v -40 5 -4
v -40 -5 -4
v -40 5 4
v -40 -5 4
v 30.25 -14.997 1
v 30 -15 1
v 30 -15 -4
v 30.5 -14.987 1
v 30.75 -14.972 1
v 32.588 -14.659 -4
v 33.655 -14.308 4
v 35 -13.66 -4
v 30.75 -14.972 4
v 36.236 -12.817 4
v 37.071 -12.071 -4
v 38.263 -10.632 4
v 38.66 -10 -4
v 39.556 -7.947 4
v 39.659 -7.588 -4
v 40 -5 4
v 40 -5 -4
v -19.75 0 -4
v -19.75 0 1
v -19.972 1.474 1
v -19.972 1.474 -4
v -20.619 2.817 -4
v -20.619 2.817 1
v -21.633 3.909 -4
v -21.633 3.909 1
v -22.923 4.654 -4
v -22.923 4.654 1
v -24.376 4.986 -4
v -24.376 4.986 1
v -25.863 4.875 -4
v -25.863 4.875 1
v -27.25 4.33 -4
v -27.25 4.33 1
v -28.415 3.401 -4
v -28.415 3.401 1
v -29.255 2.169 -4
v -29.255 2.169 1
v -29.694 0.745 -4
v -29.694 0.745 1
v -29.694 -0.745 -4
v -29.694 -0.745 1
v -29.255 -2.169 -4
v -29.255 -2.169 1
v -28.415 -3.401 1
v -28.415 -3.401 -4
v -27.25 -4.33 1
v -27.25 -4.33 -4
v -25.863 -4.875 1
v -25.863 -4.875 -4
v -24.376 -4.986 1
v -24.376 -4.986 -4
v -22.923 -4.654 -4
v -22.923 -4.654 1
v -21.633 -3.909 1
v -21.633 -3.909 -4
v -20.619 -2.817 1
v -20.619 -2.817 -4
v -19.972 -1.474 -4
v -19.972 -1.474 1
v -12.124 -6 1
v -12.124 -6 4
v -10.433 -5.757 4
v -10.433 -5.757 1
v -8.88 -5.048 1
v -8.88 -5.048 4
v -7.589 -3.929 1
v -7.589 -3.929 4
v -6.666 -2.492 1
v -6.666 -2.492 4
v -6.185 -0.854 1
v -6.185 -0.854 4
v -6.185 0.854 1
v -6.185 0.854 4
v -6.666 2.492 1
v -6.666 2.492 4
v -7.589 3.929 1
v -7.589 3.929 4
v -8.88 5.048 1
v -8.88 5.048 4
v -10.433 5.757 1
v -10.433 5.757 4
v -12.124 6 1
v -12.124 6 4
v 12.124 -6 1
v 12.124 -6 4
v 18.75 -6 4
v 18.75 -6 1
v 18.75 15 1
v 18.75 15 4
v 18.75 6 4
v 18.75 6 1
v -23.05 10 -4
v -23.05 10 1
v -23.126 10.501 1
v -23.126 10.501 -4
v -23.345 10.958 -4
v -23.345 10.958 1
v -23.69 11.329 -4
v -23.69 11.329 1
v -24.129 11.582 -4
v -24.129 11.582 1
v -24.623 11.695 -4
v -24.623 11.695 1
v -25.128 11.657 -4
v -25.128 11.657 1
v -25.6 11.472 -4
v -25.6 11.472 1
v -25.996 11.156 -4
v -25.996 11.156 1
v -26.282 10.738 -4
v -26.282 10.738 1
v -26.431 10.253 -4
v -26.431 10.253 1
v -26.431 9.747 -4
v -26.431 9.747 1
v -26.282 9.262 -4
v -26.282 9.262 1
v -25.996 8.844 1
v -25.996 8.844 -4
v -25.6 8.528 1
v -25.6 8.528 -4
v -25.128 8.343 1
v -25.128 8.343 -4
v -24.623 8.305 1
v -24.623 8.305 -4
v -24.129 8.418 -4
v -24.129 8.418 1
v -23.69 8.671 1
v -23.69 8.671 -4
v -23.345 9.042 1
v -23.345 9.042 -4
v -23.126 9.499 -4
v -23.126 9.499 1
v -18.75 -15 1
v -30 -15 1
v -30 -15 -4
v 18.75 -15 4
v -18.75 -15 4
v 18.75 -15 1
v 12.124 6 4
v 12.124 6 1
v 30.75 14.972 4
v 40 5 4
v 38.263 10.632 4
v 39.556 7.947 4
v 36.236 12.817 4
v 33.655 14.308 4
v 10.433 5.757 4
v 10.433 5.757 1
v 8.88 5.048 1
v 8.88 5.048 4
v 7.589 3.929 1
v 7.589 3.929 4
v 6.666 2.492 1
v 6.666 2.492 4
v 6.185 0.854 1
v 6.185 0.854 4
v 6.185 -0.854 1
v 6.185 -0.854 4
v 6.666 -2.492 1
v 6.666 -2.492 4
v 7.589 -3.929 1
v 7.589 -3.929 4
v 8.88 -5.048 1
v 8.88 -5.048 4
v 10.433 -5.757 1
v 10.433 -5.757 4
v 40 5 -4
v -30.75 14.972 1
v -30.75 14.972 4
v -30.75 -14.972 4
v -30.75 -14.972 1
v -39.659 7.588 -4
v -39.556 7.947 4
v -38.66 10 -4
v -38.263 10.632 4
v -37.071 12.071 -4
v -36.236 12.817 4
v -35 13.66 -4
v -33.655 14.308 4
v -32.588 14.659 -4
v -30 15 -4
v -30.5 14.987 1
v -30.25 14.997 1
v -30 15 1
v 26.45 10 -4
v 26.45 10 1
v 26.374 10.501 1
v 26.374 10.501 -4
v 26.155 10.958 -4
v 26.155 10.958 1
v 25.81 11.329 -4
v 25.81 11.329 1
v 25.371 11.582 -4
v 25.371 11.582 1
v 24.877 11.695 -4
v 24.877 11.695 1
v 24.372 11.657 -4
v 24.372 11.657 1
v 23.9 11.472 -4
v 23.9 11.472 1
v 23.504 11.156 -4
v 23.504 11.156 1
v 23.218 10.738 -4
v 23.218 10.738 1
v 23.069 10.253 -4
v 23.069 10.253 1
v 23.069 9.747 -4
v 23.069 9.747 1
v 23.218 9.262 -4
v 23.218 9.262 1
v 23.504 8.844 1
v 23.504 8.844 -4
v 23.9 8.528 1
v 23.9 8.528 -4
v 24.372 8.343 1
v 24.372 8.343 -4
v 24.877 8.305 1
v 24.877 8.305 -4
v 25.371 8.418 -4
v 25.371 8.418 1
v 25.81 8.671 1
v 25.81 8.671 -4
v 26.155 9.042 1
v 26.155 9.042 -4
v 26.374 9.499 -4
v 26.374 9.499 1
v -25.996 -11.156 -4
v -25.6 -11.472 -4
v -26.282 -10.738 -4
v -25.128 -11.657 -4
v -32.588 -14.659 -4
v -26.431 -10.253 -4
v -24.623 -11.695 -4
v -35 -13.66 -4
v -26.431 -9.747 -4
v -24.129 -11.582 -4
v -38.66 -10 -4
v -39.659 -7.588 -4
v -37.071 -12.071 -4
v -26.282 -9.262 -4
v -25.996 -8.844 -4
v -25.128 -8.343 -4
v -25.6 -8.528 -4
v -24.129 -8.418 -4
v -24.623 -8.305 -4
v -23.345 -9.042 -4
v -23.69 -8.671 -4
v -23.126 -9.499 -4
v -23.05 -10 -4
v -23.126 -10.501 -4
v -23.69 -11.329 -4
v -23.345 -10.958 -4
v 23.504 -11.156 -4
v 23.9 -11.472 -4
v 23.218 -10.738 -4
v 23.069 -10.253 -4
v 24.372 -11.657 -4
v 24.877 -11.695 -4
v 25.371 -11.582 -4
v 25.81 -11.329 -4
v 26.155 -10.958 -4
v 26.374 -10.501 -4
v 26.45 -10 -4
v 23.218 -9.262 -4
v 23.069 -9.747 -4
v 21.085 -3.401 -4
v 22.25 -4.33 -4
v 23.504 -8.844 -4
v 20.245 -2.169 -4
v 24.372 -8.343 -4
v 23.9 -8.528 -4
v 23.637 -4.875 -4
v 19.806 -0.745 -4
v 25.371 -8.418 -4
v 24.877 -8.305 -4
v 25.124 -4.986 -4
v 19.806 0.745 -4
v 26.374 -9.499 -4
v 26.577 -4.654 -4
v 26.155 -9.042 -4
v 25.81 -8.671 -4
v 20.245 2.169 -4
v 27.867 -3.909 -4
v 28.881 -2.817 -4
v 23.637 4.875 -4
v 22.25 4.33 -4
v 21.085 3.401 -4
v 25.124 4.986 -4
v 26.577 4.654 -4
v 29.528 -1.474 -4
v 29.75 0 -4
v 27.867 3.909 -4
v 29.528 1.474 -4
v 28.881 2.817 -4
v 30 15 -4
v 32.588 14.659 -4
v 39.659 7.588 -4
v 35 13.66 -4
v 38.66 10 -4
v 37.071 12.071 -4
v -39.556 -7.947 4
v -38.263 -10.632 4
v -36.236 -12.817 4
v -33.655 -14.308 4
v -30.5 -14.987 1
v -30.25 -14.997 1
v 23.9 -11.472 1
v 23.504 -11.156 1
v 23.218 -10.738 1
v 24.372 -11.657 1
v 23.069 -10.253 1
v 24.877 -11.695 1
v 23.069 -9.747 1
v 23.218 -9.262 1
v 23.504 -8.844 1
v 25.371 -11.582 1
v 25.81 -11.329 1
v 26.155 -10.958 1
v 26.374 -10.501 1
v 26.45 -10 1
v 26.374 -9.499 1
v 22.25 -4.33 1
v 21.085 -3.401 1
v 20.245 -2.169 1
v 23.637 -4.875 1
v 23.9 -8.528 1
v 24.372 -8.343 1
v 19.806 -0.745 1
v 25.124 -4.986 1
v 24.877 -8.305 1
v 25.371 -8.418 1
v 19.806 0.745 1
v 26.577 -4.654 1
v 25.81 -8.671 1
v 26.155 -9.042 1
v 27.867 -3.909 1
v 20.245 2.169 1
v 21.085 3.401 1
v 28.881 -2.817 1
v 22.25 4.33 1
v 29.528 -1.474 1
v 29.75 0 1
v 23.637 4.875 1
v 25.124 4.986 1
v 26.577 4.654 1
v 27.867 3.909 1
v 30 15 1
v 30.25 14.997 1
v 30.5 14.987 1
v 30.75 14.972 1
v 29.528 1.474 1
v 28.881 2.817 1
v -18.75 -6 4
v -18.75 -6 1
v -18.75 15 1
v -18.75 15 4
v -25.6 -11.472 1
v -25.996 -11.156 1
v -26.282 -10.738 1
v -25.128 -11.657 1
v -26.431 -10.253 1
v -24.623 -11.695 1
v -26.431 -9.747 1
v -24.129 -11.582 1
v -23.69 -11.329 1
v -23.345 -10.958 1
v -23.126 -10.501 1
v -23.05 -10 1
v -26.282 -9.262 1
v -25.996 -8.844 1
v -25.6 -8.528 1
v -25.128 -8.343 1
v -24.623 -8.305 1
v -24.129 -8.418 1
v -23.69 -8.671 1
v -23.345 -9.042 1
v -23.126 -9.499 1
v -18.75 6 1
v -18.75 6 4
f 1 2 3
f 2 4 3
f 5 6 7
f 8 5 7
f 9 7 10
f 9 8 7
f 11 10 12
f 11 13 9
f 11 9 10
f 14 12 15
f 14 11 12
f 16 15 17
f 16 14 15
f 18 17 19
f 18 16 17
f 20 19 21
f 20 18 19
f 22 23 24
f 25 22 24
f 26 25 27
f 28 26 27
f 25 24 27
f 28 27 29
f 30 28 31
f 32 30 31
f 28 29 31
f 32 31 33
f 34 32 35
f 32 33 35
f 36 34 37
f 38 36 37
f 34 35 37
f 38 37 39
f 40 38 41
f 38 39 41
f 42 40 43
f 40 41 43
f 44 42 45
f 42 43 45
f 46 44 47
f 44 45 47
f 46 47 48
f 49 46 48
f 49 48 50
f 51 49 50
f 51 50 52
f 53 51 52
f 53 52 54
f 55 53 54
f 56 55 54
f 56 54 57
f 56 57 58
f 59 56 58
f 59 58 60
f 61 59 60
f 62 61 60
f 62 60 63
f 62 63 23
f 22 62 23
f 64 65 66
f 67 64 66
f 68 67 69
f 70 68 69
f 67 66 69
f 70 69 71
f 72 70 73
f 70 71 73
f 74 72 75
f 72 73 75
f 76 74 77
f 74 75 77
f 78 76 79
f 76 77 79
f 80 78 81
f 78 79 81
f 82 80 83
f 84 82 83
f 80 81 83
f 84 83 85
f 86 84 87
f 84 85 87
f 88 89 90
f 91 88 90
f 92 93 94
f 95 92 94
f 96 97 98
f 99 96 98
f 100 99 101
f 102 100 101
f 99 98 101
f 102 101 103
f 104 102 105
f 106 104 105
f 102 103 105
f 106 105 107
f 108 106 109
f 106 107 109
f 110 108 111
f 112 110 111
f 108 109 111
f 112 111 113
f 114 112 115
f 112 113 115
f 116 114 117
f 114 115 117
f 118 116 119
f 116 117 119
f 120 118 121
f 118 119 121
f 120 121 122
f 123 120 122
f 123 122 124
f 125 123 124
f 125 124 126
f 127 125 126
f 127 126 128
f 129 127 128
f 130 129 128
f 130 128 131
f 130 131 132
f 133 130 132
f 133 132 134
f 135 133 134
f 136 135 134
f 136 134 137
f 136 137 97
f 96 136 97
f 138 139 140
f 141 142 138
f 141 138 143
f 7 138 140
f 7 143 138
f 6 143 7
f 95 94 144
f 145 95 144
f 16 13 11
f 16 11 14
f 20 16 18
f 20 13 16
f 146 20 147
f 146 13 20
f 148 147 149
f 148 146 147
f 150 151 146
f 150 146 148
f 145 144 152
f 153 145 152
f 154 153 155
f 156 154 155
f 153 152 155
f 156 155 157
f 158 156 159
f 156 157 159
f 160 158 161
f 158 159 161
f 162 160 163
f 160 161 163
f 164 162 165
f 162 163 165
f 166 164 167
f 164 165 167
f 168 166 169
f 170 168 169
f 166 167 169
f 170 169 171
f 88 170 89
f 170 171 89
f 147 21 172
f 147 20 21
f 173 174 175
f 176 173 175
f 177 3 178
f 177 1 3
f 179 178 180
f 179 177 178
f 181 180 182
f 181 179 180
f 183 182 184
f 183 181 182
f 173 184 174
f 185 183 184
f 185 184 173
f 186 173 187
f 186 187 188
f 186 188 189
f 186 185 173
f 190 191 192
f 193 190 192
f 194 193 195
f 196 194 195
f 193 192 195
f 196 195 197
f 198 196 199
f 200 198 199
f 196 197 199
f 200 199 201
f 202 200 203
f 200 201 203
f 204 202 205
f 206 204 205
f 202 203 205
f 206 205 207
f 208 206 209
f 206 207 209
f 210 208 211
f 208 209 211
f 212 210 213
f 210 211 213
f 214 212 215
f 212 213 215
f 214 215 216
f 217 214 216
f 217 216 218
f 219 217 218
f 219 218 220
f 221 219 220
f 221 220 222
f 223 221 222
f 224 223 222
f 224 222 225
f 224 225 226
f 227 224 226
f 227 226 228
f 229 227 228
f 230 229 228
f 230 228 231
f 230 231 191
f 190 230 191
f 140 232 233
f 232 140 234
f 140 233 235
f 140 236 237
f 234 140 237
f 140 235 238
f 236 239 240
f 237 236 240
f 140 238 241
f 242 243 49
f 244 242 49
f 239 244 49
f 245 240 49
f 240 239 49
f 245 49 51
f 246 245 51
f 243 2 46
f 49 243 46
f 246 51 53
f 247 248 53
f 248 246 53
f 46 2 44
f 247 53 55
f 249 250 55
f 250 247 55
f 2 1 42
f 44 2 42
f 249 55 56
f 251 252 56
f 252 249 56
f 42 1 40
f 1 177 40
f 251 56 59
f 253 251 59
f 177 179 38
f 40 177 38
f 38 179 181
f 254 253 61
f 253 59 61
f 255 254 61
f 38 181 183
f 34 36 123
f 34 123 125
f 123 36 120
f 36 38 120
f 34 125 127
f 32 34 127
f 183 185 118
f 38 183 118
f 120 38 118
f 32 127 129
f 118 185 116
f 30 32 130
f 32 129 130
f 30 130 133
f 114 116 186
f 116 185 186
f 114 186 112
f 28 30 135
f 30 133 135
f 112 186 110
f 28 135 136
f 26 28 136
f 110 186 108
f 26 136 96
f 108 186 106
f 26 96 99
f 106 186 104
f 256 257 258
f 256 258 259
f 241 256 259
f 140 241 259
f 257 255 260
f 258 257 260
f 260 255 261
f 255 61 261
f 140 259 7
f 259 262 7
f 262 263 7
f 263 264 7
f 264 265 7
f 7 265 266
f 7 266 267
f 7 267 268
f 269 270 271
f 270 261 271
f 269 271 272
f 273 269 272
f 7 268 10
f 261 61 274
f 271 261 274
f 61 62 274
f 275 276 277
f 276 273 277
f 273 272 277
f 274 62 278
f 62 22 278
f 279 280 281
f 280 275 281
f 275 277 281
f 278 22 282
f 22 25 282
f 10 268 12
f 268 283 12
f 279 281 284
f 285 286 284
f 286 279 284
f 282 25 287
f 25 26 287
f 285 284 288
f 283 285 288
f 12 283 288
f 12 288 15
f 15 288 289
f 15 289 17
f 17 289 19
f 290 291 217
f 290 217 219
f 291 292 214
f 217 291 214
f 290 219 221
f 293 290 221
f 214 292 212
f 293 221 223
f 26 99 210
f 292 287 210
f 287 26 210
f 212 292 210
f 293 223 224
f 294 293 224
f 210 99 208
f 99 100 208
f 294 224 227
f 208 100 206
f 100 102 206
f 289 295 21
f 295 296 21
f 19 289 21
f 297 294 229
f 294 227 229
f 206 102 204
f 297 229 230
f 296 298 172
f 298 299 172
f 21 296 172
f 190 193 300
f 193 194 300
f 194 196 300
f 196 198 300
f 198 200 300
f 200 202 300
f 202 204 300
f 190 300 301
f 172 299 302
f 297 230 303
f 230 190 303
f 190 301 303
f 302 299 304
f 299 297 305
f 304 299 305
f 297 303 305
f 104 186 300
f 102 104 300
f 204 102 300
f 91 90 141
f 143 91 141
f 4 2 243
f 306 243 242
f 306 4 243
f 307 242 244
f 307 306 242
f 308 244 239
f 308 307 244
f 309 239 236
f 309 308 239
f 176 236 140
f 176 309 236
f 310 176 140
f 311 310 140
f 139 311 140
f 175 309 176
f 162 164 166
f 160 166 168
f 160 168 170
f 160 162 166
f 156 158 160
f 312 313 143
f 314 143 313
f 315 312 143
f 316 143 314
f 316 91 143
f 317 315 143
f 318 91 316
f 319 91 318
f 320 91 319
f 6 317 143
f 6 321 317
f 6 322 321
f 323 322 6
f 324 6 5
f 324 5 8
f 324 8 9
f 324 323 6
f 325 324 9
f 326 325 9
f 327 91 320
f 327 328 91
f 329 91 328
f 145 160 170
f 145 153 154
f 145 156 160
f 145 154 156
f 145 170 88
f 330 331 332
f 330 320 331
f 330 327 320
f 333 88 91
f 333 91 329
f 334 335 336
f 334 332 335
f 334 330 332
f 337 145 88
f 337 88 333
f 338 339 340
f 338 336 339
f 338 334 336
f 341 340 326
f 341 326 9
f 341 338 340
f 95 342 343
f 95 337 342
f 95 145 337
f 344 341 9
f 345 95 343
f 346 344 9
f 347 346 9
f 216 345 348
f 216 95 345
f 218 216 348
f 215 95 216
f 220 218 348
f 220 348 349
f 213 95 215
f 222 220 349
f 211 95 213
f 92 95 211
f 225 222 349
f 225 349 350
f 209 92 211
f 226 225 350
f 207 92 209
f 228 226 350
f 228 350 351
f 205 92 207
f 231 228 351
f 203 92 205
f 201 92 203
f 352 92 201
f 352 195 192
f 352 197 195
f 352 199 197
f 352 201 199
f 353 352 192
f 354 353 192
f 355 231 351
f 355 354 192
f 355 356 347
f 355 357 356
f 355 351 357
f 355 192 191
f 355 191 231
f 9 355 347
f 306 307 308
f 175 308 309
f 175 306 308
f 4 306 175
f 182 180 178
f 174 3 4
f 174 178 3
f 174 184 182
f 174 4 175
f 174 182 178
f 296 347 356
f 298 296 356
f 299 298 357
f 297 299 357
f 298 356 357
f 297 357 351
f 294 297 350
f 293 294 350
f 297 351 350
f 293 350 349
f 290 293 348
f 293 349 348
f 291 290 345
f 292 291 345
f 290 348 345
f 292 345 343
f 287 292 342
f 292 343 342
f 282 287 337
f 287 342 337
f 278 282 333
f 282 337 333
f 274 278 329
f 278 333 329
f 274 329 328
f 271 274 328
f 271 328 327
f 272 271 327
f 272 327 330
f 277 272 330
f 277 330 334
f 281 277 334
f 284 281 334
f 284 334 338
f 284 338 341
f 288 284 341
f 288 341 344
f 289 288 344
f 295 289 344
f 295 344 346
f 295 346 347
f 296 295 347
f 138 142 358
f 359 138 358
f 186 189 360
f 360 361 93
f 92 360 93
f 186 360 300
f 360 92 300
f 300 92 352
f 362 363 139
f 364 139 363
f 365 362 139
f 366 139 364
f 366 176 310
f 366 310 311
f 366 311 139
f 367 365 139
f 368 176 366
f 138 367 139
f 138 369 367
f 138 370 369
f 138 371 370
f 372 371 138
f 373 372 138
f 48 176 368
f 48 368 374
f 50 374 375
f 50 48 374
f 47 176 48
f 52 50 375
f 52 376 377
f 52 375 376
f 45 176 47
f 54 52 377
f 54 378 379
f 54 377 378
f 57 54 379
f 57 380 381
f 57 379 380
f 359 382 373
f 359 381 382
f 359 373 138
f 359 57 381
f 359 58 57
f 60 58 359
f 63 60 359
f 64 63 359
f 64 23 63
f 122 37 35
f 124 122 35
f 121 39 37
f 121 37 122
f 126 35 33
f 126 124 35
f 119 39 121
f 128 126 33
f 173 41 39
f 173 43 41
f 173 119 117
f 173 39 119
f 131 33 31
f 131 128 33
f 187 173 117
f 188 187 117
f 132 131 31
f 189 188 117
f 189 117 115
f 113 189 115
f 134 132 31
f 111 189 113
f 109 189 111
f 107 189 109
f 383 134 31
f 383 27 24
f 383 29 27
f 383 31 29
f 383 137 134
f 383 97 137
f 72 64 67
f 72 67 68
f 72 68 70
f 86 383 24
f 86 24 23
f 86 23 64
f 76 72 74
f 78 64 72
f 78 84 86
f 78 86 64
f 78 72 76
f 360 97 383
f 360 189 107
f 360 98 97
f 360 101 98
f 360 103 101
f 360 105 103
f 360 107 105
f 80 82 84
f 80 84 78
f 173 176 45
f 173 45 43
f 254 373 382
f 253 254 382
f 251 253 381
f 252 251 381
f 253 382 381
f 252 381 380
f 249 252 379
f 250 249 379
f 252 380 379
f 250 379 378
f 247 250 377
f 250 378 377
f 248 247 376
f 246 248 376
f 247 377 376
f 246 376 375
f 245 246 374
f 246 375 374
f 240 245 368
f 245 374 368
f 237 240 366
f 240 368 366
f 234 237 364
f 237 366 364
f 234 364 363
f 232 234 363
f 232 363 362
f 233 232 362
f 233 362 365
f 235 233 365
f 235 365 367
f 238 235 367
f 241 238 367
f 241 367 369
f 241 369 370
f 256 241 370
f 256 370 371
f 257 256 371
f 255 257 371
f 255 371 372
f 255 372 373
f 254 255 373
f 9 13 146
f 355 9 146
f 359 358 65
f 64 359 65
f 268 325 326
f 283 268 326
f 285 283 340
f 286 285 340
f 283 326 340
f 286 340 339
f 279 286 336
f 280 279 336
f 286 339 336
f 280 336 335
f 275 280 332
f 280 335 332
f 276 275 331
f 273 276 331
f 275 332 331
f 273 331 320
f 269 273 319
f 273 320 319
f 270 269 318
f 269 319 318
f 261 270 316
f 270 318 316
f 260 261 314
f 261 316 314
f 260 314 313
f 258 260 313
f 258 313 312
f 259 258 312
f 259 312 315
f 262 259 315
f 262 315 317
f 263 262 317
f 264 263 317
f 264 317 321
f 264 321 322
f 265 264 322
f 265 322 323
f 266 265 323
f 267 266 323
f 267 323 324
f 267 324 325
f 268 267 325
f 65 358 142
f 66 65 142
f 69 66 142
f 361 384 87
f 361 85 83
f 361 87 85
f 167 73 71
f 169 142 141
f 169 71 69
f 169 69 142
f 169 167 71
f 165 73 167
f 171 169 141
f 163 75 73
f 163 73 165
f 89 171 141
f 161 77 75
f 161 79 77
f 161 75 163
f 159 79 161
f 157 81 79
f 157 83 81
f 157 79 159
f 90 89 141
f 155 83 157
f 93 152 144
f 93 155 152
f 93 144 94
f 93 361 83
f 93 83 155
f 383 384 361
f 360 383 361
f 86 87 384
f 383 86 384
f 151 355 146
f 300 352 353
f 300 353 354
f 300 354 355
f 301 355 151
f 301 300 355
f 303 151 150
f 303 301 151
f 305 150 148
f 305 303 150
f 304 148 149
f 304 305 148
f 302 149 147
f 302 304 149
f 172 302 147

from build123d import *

# Parameters (mm, degrees)
F0_W     = 80
F0_H     = 30
F1_DEPTH = 4
F3_DEPTH = 3
F4_R     = 5
F4_R_2   = 1.7
F5_DEPTH = 5.001
F6_R     = 10


with BuildPart() as f1:
    # F0 (on Top) → F1 (new body, symmetric)
    with BuildSketch(Plane.XY):
        Rectangle(F0_W, F0_H)
    extrude(amount=F1_DEPTH, both=True)

    # F2 (on face) → F3 (cut)
    with BuildSketch(Plane.XY.offset(4)):
        with BuildLine():
            Line((-18.75, 15), (-30.75, 15))
            Line((-30.75, 15), (-30.75, 7.605669))
            Line((-30.75, 7.605669), (-30.75, -15))
            Line((-30.75, -15), (-18.75, -15))
            Line((-18.75, -15), (-18.75, -6))
            Line((-18.75, -6), (-12.123867, -6))
            ThreePointArc((-12.123867, -6), (-6.123867, 0), (-12.123867, 6))
            Line((-12.123867, 6), (-18.75, 6))
            Line((-18.75, 6), (-18.75, 15))
        make_face()
        with BuildLine():
            Line((30.75, -15), (30.75, 15))
            Line((30.75, 15), (18.75, 15))
            Line((18.75, 15), (18.75, 6))
            Line((18.75, 6), (12.123867, 6))
            ThreePointArc((12.123867, 6), (6.123867, 0), (12.123867, -6))
            Line((12.123867, -6), (18.75, -6))
            Line((18.75, -6), (18.75, -15))
            Line((18.75, -15), (30.75, -15))
        make_face()
    extrude(amount=-F3_DEPTH, mode=Mode.SUBTRACT)

    # F4 (on face) → F5 (cut, through all)
    with BuildSketch(Plane.XY.offset(1)):
        with Locations((-24.75, 0)):
            Circle(F4_R)
        with Locations((-24.75, 10)):
            Circle(F4_R_2)
        with Locations((-24.75, -10)):
            Circle(F4_R_2)
        with Locations((24.75, 10)):
            Circle(F4_R_2)
        with Locations((24.75, 0)):
            Circle(F4_R)
        with Locations((24.75, -10)):
            Circle(F4_R_2)
    extrude(amount=-F5_DEPTH, mode=Mode.SUBTRACT)

    # F6
    f6_edges = [f1.edges().sort_by_distance(p)[0] for p in [
        (-40, 15, 0),
        (-40, -15, 0),
        (40, 15, 0),
        (40, -15, 0),
    ]]
    fillet(f6_edges, radius=F6_R)


solid = f1.part
